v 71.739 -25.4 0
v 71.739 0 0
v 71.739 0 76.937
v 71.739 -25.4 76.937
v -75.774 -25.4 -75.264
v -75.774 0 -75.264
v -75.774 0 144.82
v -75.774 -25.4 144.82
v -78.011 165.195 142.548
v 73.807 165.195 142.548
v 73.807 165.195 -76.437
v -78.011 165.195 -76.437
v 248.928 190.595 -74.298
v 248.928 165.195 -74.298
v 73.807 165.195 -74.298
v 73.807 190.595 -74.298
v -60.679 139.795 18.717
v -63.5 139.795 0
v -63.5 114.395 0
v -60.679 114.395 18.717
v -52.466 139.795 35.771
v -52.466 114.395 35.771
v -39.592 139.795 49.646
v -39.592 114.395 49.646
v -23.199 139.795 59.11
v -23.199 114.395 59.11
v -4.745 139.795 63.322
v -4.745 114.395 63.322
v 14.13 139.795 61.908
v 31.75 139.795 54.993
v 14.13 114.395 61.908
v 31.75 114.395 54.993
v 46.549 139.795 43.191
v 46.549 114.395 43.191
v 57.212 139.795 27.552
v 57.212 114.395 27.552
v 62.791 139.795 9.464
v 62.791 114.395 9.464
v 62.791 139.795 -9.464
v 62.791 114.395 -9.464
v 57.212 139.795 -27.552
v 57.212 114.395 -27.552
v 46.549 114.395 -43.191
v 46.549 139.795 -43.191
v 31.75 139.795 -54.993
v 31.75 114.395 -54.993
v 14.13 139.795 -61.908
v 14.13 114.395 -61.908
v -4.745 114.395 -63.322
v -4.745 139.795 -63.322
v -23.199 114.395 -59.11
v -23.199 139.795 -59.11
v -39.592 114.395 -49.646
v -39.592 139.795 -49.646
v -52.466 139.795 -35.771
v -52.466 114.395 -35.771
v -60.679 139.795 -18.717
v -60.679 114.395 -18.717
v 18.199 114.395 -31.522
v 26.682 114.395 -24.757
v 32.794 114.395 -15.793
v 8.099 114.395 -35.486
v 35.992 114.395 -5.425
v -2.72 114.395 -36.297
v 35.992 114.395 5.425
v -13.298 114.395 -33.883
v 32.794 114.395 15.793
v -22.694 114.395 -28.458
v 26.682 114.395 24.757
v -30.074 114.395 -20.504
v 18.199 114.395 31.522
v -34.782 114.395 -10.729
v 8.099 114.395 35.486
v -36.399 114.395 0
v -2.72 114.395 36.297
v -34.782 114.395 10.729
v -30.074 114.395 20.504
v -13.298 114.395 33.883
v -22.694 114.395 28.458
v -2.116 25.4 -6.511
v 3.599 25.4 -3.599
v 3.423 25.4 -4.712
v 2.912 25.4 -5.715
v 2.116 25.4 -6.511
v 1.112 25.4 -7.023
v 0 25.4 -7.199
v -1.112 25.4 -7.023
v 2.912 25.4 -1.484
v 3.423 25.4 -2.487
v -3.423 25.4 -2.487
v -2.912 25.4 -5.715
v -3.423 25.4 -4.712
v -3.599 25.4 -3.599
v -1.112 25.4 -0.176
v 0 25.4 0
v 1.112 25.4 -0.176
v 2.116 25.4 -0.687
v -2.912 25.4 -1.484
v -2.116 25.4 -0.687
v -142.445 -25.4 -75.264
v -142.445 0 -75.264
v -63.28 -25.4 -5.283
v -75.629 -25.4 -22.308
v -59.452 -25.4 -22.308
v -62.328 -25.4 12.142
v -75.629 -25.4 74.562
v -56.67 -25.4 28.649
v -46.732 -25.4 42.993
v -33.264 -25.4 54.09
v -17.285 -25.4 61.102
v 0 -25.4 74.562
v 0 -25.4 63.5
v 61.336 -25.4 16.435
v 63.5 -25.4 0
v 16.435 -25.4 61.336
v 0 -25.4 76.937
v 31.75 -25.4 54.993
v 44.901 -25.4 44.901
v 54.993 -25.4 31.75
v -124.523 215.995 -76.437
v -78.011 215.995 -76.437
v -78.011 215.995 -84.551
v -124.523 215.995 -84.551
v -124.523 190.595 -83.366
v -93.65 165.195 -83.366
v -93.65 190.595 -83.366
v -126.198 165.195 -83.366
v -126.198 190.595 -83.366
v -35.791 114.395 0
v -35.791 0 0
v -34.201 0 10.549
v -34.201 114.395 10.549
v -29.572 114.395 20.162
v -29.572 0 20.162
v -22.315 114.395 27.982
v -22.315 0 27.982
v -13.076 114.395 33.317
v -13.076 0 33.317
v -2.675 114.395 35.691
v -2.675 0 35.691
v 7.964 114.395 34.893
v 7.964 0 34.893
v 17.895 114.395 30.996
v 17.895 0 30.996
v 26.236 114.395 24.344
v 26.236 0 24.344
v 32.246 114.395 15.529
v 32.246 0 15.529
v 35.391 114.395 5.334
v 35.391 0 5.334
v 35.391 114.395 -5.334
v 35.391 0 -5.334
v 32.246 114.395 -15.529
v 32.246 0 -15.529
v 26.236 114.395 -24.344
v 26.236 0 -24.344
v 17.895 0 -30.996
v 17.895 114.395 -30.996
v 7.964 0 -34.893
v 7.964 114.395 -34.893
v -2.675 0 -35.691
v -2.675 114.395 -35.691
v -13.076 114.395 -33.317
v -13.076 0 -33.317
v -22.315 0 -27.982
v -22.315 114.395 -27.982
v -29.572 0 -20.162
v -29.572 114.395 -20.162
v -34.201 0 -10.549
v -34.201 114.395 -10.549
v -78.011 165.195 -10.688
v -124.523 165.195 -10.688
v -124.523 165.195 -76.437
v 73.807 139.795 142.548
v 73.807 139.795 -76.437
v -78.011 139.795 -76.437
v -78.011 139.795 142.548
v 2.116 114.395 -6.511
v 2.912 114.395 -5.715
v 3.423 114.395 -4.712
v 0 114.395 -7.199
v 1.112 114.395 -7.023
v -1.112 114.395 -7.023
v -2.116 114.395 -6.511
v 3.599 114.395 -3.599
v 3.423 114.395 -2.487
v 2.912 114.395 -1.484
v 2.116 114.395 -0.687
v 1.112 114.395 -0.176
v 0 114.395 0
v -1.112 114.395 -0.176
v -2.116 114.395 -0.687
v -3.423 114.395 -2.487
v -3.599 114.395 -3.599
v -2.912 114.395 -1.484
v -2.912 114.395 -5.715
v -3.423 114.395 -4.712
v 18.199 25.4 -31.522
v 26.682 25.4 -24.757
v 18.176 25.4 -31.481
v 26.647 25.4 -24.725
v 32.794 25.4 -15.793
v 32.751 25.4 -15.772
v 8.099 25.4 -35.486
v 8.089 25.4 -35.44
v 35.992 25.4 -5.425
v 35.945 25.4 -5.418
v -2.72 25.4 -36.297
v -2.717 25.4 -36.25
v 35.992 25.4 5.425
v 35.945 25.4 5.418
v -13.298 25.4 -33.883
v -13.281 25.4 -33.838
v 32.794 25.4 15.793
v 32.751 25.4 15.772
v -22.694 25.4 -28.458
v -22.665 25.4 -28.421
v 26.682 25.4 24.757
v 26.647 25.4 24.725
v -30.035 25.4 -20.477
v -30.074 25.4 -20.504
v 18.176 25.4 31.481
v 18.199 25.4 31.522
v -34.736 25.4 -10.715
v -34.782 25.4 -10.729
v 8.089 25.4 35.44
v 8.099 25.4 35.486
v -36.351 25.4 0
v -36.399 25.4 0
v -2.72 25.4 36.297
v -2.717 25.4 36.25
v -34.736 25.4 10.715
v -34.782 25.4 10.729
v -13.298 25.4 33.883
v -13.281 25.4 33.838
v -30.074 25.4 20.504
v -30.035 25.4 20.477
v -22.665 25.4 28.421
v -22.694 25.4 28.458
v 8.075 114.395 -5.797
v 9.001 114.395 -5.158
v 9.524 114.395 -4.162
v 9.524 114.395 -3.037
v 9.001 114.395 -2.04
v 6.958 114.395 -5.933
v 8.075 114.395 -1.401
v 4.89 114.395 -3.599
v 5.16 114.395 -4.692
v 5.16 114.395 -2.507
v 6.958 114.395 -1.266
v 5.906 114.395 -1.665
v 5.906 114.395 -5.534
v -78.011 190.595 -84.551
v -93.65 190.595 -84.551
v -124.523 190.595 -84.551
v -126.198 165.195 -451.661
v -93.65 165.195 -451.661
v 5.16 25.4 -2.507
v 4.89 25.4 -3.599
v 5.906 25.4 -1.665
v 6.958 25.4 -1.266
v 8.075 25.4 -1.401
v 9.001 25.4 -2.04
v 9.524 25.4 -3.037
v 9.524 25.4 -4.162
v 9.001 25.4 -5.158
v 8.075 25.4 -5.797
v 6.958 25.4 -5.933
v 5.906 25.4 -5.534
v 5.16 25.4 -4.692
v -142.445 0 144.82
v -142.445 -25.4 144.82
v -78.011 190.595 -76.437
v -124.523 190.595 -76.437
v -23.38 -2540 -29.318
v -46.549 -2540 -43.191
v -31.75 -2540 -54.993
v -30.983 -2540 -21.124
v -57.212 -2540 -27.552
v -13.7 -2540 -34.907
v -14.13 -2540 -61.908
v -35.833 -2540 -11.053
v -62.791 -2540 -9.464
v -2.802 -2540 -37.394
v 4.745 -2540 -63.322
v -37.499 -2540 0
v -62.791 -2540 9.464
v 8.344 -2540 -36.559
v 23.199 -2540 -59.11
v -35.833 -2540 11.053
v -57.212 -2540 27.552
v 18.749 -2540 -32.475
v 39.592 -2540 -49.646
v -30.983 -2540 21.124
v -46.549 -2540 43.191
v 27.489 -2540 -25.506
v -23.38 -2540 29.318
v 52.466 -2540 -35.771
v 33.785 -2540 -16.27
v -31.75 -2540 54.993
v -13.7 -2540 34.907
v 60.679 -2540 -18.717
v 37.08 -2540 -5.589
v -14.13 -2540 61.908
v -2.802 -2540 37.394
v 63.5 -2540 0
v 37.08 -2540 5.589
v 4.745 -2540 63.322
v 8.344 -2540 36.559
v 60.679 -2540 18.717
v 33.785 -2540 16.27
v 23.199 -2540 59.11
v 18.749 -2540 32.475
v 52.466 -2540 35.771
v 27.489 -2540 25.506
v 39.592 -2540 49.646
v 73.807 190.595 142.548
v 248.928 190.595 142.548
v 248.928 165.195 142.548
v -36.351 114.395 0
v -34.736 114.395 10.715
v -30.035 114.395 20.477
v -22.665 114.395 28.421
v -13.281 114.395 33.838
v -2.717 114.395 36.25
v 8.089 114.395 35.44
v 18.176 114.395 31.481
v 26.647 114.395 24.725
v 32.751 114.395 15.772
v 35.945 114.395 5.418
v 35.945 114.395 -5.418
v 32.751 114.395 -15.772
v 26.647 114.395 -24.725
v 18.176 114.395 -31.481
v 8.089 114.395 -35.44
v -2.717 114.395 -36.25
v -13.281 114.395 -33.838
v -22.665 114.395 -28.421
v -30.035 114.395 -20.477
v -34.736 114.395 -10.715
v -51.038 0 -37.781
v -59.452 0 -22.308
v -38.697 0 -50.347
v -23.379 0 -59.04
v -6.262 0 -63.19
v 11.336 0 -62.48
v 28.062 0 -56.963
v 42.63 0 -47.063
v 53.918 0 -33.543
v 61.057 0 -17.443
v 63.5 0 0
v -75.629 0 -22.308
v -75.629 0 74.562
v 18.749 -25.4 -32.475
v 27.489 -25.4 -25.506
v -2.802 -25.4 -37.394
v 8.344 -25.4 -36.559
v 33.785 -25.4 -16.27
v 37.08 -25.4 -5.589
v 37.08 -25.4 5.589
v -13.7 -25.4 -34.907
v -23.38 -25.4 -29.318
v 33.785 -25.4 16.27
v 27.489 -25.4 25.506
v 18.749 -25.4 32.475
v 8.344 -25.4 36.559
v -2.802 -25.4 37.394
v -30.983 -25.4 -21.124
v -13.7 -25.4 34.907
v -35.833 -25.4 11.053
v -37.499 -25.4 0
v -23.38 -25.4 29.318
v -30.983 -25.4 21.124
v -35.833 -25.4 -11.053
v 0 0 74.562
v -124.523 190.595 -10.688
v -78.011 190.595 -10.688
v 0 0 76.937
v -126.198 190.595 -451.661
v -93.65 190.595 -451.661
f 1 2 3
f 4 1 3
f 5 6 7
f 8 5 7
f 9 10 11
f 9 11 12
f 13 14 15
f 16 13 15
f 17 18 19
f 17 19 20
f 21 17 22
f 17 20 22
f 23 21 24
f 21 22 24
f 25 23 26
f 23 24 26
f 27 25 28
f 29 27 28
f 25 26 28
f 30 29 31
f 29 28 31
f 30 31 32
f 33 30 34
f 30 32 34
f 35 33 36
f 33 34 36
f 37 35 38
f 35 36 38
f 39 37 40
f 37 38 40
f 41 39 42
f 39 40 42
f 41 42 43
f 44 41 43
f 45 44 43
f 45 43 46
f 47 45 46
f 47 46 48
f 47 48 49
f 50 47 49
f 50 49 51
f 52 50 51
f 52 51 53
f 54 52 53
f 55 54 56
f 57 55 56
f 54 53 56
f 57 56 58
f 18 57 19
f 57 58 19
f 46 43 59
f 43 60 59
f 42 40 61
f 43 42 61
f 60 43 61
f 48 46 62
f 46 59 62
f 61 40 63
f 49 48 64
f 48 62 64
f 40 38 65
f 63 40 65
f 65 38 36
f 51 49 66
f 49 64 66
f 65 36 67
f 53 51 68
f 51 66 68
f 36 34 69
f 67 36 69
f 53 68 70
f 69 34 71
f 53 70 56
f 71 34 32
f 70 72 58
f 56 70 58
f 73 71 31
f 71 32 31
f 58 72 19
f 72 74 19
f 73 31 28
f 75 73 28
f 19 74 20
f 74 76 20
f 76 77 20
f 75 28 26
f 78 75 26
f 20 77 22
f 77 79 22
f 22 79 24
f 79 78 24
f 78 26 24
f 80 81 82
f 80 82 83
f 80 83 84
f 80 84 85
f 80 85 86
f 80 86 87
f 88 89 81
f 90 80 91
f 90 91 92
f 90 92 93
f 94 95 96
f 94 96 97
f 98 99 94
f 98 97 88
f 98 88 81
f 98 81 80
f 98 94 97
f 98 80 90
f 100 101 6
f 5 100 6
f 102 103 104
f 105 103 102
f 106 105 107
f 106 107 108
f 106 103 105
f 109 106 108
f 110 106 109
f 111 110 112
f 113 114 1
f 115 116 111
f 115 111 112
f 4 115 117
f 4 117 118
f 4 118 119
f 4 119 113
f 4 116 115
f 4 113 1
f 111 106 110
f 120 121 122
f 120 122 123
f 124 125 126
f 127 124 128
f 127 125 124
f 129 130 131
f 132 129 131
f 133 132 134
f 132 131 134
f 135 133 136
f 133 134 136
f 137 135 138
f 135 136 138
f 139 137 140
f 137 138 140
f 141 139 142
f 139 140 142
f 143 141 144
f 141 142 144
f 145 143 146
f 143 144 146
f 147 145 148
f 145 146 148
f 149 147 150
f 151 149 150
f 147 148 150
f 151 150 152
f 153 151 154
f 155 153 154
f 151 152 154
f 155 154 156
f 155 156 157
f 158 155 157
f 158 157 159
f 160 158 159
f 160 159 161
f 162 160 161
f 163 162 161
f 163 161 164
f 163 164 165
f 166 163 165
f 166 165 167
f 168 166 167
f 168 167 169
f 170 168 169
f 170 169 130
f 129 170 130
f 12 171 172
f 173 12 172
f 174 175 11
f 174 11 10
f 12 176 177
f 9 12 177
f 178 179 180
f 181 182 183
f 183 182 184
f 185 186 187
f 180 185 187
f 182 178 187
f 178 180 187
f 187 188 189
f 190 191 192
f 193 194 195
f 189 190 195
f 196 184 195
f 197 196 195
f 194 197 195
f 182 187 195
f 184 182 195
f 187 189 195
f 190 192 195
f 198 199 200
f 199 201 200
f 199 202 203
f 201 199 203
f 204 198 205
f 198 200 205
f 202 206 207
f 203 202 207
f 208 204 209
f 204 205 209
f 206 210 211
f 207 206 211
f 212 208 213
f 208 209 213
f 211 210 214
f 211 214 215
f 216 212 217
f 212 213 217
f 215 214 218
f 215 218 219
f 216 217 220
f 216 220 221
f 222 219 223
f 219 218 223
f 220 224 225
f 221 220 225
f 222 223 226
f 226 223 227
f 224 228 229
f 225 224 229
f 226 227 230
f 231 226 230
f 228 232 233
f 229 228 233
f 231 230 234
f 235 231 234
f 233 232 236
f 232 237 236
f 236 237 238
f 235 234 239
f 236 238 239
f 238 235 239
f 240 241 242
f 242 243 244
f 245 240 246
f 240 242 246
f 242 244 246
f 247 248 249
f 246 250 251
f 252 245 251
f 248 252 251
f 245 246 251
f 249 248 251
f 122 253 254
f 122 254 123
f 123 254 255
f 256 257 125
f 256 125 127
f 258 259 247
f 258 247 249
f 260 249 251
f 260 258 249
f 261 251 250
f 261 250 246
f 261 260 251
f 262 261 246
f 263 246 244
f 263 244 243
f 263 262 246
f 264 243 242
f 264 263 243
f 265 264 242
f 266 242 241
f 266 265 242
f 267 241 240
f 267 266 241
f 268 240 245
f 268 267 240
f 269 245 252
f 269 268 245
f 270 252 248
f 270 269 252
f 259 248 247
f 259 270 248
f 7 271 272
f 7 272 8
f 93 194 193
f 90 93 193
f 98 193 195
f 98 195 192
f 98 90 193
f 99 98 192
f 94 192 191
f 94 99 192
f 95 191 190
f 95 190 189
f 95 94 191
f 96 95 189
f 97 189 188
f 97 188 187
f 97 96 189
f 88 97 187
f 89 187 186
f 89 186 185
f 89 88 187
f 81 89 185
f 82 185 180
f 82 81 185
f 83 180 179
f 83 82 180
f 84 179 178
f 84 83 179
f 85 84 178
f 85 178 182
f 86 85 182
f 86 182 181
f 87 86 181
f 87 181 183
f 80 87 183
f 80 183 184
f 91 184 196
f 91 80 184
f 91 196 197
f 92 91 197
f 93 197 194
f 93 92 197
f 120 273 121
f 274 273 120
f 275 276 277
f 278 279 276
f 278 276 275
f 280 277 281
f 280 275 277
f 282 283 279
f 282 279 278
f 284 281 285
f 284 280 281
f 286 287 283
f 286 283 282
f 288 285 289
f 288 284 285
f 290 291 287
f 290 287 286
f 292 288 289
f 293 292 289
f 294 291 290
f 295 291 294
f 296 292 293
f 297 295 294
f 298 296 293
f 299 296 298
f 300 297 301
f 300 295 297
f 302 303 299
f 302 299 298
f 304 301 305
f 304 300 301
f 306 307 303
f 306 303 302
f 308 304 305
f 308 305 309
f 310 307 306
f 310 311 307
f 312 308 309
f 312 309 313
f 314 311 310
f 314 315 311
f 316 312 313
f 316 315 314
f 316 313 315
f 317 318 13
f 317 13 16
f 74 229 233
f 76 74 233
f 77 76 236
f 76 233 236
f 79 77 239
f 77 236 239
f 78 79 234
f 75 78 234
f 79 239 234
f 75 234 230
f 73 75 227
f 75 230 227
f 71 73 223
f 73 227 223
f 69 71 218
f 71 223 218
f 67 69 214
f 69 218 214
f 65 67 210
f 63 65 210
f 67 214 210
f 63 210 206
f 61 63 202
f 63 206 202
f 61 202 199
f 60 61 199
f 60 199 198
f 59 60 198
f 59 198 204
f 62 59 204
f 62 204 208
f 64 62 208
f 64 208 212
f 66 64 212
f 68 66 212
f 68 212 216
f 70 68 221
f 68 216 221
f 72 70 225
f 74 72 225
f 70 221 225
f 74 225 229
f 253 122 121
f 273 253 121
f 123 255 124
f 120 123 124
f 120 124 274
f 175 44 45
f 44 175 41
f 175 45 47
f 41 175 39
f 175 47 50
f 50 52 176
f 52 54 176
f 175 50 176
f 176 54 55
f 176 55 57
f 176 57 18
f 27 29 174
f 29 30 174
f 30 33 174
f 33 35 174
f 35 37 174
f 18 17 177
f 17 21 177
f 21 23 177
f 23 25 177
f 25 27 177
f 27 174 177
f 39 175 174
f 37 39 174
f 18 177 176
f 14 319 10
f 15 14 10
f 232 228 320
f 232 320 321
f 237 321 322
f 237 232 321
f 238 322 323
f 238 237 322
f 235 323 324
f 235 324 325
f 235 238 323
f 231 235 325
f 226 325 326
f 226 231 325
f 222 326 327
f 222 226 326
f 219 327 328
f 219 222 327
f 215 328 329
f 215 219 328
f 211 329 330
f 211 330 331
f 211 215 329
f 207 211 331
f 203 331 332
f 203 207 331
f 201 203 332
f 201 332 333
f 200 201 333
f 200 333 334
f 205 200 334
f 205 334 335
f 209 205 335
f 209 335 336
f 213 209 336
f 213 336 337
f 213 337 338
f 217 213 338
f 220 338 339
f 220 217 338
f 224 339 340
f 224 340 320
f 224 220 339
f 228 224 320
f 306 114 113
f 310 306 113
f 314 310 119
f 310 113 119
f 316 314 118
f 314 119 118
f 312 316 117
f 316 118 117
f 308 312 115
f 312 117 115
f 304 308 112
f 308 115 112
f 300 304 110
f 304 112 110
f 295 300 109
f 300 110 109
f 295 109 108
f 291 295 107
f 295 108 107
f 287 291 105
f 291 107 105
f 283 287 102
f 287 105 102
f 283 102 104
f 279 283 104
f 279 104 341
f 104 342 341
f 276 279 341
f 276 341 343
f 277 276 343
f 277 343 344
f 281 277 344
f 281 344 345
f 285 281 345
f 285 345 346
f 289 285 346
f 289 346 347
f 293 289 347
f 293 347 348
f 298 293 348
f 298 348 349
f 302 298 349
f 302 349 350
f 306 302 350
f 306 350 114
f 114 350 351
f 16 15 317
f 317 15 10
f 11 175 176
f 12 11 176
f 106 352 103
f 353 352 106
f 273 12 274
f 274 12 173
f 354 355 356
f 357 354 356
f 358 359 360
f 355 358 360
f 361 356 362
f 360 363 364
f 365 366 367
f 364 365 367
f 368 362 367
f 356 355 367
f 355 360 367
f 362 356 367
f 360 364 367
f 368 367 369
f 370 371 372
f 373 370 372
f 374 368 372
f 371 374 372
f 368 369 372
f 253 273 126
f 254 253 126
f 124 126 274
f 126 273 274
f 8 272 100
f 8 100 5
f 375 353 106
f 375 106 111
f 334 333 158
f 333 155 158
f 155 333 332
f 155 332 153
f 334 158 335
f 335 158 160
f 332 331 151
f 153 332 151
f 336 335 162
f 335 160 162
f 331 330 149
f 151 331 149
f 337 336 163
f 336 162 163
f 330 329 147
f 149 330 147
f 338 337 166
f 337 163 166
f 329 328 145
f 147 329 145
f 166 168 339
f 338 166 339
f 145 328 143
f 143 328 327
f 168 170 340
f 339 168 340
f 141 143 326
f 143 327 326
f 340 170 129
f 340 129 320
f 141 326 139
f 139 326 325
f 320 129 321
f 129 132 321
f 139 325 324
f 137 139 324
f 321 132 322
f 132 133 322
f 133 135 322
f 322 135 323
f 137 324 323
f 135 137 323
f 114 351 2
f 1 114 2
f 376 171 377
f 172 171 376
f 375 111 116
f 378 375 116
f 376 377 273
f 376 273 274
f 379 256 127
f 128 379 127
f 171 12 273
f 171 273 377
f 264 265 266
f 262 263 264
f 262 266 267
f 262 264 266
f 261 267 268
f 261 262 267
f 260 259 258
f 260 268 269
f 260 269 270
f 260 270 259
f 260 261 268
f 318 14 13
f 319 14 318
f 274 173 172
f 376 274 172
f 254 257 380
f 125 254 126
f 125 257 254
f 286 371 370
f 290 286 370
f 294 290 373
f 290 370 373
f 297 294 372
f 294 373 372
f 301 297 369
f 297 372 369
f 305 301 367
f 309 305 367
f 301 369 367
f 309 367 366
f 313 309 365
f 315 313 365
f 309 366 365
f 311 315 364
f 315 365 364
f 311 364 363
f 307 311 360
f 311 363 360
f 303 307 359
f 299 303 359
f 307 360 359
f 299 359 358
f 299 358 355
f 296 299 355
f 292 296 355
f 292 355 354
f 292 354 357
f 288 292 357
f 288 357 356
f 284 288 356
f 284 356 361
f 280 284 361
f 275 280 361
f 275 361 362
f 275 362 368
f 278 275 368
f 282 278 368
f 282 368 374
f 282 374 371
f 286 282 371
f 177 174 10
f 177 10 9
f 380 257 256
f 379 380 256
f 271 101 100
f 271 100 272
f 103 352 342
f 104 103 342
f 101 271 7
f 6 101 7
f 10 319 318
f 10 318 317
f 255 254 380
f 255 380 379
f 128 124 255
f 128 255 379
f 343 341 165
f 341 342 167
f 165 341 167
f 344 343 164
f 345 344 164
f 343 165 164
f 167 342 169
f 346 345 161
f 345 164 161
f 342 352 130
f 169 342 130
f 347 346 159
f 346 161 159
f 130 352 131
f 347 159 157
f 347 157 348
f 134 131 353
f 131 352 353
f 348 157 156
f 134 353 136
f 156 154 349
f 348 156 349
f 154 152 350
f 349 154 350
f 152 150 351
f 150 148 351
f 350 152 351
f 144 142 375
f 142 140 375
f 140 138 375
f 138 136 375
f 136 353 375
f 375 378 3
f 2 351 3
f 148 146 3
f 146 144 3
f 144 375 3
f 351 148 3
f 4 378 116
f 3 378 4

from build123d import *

# Parameters (mm, degrees)
F0_R      = 63.5
F1_DEPTH  = 2540
F2_R      = 37.498798
F3_DEPTH  = 2540.001
F4_R      = 37.498798
F5_DEPTH  = 25.4
F6_R      = 35.790609
F7_DEPTH  = 25.4
F8_R      = 36.398769
F8_R_2    = 36.35133
F8_R_3    = 35.790609
F8_R_4    = 2.350896
F8_R_5    = 3.599335
F9_DEPTH  = 88.995427
F10_R     = 63.5
F11_DEPTH = 25.4
F15_W     = 75.628899
F15_H     = 96.870379
F16_DEPTH = 25.4
F17_W     = 71.739011
F17_H     = 76.93696
F18_DEPTH = 25.4
F19_W     = 66.671423
F19_H     = 220.084563
F20_DEPTH = 25.4
F21_W     = 151.817322
F21_H     = 218.985304
F22_DEPTH = 25.4
F23_W     = 175.12086
F23_H     = 216.846026
F24_DEPTH = 25.4
F25_W     = 32.548204
F25_H     = 368.294932
F26_DEPTH = 25.4
F27_W     = 46.512127
F27_H     = 65.749884
F28_DEPTH = 25.4
F29_W     = 46.512127
F29_H     = 8.113734
F30_DEPTH = 25.4


with BuildPart() as f1:
    # F0 (on Front) → F1 (new body)
    with BuildSketch(Plane.XZ):
        Circle(F0_R)
    extrude(amount=F1_DEPTH)

    # F2 (on face) → F3 (cut, through all)
    with BuildSketch(Plane(origin=(0, 0, 0), x_dir=(-1, 0, 0), z_dir=(0, 1, 0))):
        Circle(F2_R)
    extrude(amount=-F3_DEPTH, mode=Mode.SUBTRACT)

    # F4 (on face) → F5 (join)
    with BuildSketch(Plane(origin=(0, 0, 0), x_dir=(-1, 0, 0), z_dir=(0, 1, 0))):
        Circle(F4_R)
    extrude(amount=-F5_DEPTH)

    # F6 (on face) → F7 (join)
    with BuildSketch(Plane(origin=(0, 0, 0), x_dir=(-1, 0, 0), z_dir=(0, 1, 0))):
        Circle(F6_R)
    extrude(amount=F7_DEPTH)

    # F8 (on face) → F9 (join)
    with BuildSketch(Plane(origin=(0, 25.4, 0), x_dir=(-1, 0, 0), z_dir=(0, 1, 0))):
        Circle(F8_R)
        Circle(F8_R_2, mode=Mode.SUBTRACT)
        Circle(F8_R_3)
        with Locations((-7.241368, -3.599335)):
            Circle(F8_R_4, mode=Mode.SUBTRACT)
        with Locations((0, -3.599335)):
            Circle(F8_R_5, mode=Mode.SUBTRACT)
    extrude(amount=F9_DEPTH)

    # F10 (on face) → F11 (join)
    with BuildSketch(Plane(origin=(0, 114.395427, 0), x_dir=(-1, 0, 0), z_dir=(0, 1, 0))):
        Circle(F10_R)
    extrude(amount=F11_DEPTH)

    # F15 (on face) → F16 (join)
    with BuildSketch(Plane.XZ):
        with Locations((-37.814449, 26.126942)):
            Rectangle(F15_W, F15_H)
    extrude(amount=F16_DEPTH)

    # F17 (on face) → F18 (join)
    with BuildSketch(Plane.XZ):
        with Locations((35.869505, 38.46848)):
            Rectangle(F17_W, F17_H)
    extrude(amount=F18_DEPTH)

    # F21 (on face) → F22 (join)
    with BuildSketch(Plane(origin=(0, 139.795427, 0), x_dir=(-1, 0, 0), z_dir=(0, 1, 0))):
        with Locations((2.101943, 33.055253)):
            Rectangle(F21_W, F21_H)
    extrude(amount=F22_DEPTH)


with BuildPart() as f20:
    # F19 (on Front) → F20 (new body)
    with BuildSketch(Plane.XZ):
        with Locations((-109.109718, 34.777902)):
            Rectangle(F19_W, F19_H)
    extrude(amount=F20_DEPTH)


with BuildPart() as f24:
    # F23 (on face) → F24 (new body)
    with BuildSketch(Plane(origin=(0, 165.195427, 0), x_dir=(-1, 0, 0), z_dir=(0, 1, 0))):
        with Locations((-161.367148, 34.124892)):
            Rectangle(F23_W, F23_H)
    extrude(amount=F24_DEPTH)


with BuildPart() as f26:
    # F25 (on face) → F26 (new body)
    with BuildSketch(Plane(origin=(0, 165.195427, 0), x_dir=(-1, 0, 0), z_dir=(0, 1, 0))):
        with Locations((109.924279, -267.513227)):
            Rectangle(F25_W, F25_H)
    extrude(amount=F26_DEPTH)



with BuildPart() as f28:
    # F27 (on face) → F28 (new body)
    with BuildSketch(Plane(origin=(0, 165.195427, 0), x_dir=(-1, 0, 0), z_dir=(0, 1, 0))):
        with Locations((101.266667, -43.562457)):
            Rectangle(F27_W, F27_H)
    extrude(amount=F28_DEPTH)


with BuildPart() as f26_1:
    add(f26.part)

    add(f28.part)  # F30 merges F28
    # F29 (on face) → F30 (join)
    with BuildSketch(Plane(origin=(0, 190.595427, 0), x_dir=(-1, 0, 0), z_dir=(0, 1, 0))):
        with Locations((101.266667, -80.494266)):
            Rectangle(F29_W, F29_H)
    extrude(amount=F30_DEPTH)


solid = Compound([f1.part, f20.part, f24.part, f26_1.part])
